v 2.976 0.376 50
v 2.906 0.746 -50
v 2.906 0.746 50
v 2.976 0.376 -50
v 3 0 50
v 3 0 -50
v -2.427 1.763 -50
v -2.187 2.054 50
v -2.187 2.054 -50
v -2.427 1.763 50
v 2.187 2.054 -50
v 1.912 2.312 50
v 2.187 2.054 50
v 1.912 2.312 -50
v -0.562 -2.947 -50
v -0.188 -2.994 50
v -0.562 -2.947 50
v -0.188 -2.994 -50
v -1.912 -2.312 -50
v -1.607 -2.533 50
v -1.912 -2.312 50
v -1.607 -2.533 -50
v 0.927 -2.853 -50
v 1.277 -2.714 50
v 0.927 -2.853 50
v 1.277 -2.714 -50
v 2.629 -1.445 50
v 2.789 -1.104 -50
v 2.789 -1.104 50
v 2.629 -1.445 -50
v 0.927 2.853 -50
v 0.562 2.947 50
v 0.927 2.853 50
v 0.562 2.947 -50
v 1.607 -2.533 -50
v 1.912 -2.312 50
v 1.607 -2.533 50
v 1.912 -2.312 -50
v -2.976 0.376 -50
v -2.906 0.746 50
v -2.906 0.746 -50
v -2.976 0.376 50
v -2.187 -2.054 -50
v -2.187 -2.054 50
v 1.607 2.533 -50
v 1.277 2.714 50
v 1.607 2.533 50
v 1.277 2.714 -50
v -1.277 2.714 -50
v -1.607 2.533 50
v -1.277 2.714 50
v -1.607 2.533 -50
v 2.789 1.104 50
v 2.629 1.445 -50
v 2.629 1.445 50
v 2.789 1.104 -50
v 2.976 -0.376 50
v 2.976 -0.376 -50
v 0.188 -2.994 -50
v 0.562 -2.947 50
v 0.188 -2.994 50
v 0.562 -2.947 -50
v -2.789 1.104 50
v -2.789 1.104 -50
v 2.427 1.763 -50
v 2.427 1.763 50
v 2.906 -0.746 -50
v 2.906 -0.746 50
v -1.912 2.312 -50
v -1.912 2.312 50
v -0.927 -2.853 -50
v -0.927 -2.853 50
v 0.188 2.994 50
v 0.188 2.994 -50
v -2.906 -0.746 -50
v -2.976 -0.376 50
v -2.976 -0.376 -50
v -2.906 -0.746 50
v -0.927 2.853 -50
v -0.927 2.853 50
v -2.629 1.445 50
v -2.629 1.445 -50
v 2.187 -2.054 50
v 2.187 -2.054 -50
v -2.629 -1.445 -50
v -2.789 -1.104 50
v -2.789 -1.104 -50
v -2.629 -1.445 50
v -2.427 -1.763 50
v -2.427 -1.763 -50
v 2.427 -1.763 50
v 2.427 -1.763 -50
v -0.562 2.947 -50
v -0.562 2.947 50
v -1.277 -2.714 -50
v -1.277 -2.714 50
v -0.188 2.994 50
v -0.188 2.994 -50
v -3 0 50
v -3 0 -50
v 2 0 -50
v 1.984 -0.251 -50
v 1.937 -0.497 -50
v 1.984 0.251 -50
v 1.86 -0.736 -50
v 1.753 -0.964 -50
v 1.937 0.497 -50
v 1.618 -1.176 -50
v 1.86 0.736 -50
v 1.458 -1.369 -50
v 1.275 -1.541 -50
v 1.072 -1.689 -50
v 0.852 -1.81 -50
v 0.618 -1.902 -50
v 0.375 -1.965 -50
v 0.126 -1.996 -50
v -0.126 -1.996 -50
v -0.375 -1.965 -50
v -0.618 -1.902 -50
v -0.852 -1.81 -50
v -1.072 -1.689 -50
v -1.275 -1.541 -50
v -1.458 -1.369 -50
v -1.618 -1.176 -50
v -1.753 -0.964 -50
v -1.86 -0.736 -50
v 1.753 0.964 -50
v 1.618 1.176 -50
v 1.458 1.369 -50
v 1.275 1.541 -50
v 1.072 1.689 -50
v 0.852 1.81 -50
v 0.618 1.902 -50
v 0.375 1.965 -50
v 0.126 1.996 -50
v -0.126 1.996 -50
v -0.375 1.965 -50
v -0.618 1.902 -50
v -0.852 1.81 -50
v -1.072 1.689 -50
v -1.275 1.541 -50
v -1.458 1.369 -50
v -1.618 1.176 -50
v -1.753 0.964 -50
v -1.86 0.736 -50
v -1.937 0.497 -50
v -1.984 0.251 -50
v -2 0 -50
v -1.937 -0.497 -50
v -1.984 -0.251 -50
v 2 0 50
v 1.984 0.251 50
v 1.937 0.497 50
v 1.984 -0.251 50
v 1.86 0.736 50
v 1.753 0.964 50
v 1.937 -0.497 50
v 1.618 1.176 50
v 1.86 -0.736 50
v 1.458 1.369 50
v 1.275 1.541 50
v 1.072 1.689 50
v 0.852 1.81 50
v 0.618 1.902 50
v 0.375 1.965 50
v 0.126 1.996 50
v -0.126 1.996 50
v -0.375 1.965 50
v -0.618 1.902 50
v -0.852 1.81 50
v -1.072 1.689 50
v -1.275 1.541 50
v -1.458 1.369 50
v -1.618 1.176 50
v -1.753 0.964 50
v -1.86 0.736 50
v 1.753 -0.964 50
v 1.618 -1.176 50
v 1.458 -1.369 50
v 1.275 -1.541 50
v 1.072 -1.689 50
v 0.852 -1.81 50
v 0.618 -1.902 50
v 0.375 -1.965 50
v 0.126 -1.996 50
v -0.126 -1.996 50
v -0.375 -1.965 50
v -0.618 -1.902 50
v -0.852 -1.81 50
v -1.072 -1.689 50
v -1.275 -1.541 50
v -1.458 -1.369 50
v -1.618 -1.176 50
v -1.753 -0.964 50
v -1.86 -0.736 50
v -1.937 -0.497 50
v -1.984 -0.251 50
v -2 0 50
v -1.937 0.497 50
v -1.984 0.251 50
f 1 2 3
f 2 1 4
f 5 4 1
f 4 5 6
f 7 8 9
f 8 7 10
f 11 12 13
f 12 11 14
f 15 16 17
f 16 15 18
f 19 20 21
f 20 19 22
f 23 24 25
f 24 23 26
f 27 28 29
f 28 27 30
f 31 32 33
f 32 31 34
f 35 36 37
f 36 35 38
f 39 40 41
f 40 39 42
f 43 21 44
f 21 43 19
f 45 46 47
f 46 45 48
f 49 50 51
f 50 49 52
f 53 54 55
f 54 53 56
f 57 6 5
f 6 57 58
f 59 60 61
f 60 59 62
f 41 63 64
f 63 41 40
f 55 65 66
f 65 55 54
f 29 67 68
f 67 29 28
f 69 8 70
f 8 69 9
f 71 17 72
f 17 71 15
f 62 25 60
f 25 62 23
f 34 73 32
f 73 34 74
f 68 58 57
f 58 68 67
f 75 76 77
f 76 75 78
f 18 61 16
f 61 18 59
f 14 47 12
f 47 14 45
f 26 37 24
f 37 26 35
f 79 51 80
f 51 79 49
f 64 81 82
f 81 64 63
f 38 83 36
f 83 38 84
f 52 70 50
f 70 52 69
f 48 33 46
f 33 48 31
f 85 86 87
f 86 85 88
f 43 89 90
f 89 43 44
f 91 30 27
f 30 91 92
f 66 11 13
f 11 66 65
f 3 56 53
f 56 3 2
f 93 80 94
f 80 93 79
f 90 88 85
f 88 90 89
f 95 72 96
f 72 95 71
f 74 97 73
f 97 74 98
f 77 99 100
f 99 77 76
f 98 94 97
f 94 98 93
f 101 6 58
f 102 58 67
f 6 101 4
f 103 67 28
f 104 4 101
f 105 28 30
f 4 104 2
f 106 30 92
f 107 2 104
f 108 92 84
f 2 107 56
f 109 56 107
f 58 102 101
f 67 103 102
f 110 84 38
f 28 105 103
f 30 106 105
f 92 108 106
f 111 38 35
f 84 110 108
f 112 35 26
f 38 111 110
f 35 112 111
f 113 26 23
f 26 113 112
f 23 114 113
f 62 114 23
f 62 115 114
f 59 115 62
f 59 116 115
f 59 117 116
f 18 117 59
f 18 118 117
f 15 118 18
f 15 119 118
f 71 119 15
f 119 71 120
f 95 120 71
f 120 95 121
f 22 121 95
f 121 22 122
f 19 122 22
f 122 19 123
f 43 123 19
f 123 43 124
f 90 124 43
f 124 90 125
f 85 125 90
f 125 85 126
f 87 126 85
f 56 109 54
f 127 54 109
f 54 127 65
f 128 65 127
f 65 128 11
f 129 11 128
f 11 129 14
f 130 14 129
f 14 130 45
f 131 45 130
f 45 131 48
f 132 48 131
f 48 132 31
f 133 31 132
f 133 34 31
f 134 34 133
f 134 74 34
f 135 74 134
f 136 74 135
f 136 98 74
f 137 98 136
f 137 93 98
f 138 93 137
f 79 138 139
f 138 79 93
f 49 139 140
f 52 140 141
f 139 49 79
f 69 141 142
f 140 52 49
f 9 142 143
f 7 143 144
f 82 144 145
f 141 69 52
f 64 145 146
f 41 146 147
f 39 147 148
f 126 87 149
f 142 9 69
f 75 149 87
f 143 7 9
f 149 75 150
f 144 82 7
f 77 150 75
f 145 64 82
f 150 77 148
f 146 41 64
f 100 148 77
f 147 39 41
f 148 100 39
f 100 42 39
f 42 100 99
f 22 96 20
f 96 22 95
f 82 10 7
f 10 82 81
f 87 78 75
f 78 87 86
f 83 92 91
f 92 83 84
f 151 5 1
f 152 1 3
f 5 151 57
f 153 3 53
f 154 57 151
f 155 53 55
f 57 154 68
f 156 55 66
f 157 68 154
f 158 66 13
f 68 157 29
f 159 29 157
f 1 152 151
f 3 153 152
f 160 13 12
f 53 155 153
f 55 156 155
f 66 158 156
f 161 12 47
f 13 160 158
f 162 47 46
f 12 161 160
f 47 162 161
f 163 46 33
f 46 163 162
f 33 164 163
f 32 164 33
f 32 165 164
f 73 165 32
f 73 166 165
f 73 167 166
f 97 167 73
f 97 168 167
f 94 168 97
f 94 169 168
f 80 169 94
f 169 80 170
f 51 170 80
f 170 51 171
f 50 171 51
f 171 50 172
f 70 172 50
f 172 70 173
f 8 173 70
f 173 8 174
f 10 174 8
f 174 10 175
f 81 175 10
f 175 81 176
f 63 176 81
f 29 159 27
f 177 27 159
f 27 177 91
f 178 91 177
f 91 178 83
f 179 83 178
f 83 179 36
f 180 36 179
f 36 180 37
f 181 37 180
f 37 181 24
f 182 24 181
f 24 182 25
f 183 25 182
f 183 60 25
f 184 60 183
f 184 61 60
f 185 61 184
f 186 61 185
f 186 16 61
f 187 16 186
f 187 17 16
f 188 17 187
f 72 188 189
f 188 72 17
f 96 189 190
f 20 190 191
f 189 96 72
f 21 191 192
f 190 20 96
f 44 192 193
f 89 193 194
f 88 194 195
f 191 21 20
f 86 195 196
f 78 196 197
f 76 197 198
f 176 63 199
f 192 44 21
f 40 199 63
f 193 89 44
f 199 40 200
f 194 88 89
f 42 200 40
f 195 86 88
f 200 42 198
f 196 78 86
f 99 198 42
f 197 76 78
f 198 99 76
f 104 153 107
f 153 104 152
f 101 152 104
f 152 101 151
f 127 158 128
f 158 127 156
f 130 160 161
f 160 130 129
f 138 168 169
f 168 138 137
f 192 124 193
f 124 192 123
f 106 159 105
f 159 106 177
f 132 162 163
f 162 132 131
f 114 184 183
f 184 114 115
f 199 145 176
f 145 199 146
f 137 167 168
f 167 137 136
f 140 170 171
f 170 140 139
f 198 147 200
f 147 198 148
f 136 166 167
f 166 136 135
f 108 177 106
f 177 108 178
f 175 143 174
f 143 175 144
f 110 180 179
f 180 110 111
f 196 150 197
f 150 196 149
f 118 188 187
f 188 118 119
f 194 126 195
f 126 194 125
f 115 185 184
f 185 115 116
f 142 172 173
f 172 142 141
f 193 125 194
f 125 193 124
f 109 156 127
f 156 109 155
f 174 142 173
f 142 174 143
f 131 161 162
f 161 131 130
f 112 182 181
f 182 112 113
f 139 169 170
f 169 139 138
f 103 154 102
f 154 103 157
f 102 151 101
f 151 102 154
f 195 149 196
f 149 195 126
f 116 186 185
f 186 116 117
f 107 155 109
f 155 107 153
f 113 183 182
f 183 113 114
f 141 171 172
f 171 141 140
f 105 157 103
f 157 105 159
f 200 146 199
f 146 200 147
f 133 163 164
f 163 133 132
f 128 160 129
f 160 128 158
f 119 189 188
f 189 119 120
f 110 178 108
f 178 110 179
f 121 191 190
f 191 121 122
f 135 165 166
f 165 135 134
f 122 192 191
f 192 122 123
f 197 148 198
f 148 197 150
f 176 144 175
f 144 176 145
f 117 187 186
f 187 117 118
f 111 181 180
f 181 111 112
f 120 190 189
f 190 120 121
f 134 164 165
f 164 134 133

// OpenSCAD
$fn = 50;


difference() {
	union() {
		translate(v = [0, 0, -50.0000000000]) {
			cylinder(h = 100, r = 3.0000000000);
		}
	}
	union() {
		translate(v = [0, 0, -100.0000000000]) {
			cylinder(h = 200, r = 2.0000000000);
		}
	}
}
